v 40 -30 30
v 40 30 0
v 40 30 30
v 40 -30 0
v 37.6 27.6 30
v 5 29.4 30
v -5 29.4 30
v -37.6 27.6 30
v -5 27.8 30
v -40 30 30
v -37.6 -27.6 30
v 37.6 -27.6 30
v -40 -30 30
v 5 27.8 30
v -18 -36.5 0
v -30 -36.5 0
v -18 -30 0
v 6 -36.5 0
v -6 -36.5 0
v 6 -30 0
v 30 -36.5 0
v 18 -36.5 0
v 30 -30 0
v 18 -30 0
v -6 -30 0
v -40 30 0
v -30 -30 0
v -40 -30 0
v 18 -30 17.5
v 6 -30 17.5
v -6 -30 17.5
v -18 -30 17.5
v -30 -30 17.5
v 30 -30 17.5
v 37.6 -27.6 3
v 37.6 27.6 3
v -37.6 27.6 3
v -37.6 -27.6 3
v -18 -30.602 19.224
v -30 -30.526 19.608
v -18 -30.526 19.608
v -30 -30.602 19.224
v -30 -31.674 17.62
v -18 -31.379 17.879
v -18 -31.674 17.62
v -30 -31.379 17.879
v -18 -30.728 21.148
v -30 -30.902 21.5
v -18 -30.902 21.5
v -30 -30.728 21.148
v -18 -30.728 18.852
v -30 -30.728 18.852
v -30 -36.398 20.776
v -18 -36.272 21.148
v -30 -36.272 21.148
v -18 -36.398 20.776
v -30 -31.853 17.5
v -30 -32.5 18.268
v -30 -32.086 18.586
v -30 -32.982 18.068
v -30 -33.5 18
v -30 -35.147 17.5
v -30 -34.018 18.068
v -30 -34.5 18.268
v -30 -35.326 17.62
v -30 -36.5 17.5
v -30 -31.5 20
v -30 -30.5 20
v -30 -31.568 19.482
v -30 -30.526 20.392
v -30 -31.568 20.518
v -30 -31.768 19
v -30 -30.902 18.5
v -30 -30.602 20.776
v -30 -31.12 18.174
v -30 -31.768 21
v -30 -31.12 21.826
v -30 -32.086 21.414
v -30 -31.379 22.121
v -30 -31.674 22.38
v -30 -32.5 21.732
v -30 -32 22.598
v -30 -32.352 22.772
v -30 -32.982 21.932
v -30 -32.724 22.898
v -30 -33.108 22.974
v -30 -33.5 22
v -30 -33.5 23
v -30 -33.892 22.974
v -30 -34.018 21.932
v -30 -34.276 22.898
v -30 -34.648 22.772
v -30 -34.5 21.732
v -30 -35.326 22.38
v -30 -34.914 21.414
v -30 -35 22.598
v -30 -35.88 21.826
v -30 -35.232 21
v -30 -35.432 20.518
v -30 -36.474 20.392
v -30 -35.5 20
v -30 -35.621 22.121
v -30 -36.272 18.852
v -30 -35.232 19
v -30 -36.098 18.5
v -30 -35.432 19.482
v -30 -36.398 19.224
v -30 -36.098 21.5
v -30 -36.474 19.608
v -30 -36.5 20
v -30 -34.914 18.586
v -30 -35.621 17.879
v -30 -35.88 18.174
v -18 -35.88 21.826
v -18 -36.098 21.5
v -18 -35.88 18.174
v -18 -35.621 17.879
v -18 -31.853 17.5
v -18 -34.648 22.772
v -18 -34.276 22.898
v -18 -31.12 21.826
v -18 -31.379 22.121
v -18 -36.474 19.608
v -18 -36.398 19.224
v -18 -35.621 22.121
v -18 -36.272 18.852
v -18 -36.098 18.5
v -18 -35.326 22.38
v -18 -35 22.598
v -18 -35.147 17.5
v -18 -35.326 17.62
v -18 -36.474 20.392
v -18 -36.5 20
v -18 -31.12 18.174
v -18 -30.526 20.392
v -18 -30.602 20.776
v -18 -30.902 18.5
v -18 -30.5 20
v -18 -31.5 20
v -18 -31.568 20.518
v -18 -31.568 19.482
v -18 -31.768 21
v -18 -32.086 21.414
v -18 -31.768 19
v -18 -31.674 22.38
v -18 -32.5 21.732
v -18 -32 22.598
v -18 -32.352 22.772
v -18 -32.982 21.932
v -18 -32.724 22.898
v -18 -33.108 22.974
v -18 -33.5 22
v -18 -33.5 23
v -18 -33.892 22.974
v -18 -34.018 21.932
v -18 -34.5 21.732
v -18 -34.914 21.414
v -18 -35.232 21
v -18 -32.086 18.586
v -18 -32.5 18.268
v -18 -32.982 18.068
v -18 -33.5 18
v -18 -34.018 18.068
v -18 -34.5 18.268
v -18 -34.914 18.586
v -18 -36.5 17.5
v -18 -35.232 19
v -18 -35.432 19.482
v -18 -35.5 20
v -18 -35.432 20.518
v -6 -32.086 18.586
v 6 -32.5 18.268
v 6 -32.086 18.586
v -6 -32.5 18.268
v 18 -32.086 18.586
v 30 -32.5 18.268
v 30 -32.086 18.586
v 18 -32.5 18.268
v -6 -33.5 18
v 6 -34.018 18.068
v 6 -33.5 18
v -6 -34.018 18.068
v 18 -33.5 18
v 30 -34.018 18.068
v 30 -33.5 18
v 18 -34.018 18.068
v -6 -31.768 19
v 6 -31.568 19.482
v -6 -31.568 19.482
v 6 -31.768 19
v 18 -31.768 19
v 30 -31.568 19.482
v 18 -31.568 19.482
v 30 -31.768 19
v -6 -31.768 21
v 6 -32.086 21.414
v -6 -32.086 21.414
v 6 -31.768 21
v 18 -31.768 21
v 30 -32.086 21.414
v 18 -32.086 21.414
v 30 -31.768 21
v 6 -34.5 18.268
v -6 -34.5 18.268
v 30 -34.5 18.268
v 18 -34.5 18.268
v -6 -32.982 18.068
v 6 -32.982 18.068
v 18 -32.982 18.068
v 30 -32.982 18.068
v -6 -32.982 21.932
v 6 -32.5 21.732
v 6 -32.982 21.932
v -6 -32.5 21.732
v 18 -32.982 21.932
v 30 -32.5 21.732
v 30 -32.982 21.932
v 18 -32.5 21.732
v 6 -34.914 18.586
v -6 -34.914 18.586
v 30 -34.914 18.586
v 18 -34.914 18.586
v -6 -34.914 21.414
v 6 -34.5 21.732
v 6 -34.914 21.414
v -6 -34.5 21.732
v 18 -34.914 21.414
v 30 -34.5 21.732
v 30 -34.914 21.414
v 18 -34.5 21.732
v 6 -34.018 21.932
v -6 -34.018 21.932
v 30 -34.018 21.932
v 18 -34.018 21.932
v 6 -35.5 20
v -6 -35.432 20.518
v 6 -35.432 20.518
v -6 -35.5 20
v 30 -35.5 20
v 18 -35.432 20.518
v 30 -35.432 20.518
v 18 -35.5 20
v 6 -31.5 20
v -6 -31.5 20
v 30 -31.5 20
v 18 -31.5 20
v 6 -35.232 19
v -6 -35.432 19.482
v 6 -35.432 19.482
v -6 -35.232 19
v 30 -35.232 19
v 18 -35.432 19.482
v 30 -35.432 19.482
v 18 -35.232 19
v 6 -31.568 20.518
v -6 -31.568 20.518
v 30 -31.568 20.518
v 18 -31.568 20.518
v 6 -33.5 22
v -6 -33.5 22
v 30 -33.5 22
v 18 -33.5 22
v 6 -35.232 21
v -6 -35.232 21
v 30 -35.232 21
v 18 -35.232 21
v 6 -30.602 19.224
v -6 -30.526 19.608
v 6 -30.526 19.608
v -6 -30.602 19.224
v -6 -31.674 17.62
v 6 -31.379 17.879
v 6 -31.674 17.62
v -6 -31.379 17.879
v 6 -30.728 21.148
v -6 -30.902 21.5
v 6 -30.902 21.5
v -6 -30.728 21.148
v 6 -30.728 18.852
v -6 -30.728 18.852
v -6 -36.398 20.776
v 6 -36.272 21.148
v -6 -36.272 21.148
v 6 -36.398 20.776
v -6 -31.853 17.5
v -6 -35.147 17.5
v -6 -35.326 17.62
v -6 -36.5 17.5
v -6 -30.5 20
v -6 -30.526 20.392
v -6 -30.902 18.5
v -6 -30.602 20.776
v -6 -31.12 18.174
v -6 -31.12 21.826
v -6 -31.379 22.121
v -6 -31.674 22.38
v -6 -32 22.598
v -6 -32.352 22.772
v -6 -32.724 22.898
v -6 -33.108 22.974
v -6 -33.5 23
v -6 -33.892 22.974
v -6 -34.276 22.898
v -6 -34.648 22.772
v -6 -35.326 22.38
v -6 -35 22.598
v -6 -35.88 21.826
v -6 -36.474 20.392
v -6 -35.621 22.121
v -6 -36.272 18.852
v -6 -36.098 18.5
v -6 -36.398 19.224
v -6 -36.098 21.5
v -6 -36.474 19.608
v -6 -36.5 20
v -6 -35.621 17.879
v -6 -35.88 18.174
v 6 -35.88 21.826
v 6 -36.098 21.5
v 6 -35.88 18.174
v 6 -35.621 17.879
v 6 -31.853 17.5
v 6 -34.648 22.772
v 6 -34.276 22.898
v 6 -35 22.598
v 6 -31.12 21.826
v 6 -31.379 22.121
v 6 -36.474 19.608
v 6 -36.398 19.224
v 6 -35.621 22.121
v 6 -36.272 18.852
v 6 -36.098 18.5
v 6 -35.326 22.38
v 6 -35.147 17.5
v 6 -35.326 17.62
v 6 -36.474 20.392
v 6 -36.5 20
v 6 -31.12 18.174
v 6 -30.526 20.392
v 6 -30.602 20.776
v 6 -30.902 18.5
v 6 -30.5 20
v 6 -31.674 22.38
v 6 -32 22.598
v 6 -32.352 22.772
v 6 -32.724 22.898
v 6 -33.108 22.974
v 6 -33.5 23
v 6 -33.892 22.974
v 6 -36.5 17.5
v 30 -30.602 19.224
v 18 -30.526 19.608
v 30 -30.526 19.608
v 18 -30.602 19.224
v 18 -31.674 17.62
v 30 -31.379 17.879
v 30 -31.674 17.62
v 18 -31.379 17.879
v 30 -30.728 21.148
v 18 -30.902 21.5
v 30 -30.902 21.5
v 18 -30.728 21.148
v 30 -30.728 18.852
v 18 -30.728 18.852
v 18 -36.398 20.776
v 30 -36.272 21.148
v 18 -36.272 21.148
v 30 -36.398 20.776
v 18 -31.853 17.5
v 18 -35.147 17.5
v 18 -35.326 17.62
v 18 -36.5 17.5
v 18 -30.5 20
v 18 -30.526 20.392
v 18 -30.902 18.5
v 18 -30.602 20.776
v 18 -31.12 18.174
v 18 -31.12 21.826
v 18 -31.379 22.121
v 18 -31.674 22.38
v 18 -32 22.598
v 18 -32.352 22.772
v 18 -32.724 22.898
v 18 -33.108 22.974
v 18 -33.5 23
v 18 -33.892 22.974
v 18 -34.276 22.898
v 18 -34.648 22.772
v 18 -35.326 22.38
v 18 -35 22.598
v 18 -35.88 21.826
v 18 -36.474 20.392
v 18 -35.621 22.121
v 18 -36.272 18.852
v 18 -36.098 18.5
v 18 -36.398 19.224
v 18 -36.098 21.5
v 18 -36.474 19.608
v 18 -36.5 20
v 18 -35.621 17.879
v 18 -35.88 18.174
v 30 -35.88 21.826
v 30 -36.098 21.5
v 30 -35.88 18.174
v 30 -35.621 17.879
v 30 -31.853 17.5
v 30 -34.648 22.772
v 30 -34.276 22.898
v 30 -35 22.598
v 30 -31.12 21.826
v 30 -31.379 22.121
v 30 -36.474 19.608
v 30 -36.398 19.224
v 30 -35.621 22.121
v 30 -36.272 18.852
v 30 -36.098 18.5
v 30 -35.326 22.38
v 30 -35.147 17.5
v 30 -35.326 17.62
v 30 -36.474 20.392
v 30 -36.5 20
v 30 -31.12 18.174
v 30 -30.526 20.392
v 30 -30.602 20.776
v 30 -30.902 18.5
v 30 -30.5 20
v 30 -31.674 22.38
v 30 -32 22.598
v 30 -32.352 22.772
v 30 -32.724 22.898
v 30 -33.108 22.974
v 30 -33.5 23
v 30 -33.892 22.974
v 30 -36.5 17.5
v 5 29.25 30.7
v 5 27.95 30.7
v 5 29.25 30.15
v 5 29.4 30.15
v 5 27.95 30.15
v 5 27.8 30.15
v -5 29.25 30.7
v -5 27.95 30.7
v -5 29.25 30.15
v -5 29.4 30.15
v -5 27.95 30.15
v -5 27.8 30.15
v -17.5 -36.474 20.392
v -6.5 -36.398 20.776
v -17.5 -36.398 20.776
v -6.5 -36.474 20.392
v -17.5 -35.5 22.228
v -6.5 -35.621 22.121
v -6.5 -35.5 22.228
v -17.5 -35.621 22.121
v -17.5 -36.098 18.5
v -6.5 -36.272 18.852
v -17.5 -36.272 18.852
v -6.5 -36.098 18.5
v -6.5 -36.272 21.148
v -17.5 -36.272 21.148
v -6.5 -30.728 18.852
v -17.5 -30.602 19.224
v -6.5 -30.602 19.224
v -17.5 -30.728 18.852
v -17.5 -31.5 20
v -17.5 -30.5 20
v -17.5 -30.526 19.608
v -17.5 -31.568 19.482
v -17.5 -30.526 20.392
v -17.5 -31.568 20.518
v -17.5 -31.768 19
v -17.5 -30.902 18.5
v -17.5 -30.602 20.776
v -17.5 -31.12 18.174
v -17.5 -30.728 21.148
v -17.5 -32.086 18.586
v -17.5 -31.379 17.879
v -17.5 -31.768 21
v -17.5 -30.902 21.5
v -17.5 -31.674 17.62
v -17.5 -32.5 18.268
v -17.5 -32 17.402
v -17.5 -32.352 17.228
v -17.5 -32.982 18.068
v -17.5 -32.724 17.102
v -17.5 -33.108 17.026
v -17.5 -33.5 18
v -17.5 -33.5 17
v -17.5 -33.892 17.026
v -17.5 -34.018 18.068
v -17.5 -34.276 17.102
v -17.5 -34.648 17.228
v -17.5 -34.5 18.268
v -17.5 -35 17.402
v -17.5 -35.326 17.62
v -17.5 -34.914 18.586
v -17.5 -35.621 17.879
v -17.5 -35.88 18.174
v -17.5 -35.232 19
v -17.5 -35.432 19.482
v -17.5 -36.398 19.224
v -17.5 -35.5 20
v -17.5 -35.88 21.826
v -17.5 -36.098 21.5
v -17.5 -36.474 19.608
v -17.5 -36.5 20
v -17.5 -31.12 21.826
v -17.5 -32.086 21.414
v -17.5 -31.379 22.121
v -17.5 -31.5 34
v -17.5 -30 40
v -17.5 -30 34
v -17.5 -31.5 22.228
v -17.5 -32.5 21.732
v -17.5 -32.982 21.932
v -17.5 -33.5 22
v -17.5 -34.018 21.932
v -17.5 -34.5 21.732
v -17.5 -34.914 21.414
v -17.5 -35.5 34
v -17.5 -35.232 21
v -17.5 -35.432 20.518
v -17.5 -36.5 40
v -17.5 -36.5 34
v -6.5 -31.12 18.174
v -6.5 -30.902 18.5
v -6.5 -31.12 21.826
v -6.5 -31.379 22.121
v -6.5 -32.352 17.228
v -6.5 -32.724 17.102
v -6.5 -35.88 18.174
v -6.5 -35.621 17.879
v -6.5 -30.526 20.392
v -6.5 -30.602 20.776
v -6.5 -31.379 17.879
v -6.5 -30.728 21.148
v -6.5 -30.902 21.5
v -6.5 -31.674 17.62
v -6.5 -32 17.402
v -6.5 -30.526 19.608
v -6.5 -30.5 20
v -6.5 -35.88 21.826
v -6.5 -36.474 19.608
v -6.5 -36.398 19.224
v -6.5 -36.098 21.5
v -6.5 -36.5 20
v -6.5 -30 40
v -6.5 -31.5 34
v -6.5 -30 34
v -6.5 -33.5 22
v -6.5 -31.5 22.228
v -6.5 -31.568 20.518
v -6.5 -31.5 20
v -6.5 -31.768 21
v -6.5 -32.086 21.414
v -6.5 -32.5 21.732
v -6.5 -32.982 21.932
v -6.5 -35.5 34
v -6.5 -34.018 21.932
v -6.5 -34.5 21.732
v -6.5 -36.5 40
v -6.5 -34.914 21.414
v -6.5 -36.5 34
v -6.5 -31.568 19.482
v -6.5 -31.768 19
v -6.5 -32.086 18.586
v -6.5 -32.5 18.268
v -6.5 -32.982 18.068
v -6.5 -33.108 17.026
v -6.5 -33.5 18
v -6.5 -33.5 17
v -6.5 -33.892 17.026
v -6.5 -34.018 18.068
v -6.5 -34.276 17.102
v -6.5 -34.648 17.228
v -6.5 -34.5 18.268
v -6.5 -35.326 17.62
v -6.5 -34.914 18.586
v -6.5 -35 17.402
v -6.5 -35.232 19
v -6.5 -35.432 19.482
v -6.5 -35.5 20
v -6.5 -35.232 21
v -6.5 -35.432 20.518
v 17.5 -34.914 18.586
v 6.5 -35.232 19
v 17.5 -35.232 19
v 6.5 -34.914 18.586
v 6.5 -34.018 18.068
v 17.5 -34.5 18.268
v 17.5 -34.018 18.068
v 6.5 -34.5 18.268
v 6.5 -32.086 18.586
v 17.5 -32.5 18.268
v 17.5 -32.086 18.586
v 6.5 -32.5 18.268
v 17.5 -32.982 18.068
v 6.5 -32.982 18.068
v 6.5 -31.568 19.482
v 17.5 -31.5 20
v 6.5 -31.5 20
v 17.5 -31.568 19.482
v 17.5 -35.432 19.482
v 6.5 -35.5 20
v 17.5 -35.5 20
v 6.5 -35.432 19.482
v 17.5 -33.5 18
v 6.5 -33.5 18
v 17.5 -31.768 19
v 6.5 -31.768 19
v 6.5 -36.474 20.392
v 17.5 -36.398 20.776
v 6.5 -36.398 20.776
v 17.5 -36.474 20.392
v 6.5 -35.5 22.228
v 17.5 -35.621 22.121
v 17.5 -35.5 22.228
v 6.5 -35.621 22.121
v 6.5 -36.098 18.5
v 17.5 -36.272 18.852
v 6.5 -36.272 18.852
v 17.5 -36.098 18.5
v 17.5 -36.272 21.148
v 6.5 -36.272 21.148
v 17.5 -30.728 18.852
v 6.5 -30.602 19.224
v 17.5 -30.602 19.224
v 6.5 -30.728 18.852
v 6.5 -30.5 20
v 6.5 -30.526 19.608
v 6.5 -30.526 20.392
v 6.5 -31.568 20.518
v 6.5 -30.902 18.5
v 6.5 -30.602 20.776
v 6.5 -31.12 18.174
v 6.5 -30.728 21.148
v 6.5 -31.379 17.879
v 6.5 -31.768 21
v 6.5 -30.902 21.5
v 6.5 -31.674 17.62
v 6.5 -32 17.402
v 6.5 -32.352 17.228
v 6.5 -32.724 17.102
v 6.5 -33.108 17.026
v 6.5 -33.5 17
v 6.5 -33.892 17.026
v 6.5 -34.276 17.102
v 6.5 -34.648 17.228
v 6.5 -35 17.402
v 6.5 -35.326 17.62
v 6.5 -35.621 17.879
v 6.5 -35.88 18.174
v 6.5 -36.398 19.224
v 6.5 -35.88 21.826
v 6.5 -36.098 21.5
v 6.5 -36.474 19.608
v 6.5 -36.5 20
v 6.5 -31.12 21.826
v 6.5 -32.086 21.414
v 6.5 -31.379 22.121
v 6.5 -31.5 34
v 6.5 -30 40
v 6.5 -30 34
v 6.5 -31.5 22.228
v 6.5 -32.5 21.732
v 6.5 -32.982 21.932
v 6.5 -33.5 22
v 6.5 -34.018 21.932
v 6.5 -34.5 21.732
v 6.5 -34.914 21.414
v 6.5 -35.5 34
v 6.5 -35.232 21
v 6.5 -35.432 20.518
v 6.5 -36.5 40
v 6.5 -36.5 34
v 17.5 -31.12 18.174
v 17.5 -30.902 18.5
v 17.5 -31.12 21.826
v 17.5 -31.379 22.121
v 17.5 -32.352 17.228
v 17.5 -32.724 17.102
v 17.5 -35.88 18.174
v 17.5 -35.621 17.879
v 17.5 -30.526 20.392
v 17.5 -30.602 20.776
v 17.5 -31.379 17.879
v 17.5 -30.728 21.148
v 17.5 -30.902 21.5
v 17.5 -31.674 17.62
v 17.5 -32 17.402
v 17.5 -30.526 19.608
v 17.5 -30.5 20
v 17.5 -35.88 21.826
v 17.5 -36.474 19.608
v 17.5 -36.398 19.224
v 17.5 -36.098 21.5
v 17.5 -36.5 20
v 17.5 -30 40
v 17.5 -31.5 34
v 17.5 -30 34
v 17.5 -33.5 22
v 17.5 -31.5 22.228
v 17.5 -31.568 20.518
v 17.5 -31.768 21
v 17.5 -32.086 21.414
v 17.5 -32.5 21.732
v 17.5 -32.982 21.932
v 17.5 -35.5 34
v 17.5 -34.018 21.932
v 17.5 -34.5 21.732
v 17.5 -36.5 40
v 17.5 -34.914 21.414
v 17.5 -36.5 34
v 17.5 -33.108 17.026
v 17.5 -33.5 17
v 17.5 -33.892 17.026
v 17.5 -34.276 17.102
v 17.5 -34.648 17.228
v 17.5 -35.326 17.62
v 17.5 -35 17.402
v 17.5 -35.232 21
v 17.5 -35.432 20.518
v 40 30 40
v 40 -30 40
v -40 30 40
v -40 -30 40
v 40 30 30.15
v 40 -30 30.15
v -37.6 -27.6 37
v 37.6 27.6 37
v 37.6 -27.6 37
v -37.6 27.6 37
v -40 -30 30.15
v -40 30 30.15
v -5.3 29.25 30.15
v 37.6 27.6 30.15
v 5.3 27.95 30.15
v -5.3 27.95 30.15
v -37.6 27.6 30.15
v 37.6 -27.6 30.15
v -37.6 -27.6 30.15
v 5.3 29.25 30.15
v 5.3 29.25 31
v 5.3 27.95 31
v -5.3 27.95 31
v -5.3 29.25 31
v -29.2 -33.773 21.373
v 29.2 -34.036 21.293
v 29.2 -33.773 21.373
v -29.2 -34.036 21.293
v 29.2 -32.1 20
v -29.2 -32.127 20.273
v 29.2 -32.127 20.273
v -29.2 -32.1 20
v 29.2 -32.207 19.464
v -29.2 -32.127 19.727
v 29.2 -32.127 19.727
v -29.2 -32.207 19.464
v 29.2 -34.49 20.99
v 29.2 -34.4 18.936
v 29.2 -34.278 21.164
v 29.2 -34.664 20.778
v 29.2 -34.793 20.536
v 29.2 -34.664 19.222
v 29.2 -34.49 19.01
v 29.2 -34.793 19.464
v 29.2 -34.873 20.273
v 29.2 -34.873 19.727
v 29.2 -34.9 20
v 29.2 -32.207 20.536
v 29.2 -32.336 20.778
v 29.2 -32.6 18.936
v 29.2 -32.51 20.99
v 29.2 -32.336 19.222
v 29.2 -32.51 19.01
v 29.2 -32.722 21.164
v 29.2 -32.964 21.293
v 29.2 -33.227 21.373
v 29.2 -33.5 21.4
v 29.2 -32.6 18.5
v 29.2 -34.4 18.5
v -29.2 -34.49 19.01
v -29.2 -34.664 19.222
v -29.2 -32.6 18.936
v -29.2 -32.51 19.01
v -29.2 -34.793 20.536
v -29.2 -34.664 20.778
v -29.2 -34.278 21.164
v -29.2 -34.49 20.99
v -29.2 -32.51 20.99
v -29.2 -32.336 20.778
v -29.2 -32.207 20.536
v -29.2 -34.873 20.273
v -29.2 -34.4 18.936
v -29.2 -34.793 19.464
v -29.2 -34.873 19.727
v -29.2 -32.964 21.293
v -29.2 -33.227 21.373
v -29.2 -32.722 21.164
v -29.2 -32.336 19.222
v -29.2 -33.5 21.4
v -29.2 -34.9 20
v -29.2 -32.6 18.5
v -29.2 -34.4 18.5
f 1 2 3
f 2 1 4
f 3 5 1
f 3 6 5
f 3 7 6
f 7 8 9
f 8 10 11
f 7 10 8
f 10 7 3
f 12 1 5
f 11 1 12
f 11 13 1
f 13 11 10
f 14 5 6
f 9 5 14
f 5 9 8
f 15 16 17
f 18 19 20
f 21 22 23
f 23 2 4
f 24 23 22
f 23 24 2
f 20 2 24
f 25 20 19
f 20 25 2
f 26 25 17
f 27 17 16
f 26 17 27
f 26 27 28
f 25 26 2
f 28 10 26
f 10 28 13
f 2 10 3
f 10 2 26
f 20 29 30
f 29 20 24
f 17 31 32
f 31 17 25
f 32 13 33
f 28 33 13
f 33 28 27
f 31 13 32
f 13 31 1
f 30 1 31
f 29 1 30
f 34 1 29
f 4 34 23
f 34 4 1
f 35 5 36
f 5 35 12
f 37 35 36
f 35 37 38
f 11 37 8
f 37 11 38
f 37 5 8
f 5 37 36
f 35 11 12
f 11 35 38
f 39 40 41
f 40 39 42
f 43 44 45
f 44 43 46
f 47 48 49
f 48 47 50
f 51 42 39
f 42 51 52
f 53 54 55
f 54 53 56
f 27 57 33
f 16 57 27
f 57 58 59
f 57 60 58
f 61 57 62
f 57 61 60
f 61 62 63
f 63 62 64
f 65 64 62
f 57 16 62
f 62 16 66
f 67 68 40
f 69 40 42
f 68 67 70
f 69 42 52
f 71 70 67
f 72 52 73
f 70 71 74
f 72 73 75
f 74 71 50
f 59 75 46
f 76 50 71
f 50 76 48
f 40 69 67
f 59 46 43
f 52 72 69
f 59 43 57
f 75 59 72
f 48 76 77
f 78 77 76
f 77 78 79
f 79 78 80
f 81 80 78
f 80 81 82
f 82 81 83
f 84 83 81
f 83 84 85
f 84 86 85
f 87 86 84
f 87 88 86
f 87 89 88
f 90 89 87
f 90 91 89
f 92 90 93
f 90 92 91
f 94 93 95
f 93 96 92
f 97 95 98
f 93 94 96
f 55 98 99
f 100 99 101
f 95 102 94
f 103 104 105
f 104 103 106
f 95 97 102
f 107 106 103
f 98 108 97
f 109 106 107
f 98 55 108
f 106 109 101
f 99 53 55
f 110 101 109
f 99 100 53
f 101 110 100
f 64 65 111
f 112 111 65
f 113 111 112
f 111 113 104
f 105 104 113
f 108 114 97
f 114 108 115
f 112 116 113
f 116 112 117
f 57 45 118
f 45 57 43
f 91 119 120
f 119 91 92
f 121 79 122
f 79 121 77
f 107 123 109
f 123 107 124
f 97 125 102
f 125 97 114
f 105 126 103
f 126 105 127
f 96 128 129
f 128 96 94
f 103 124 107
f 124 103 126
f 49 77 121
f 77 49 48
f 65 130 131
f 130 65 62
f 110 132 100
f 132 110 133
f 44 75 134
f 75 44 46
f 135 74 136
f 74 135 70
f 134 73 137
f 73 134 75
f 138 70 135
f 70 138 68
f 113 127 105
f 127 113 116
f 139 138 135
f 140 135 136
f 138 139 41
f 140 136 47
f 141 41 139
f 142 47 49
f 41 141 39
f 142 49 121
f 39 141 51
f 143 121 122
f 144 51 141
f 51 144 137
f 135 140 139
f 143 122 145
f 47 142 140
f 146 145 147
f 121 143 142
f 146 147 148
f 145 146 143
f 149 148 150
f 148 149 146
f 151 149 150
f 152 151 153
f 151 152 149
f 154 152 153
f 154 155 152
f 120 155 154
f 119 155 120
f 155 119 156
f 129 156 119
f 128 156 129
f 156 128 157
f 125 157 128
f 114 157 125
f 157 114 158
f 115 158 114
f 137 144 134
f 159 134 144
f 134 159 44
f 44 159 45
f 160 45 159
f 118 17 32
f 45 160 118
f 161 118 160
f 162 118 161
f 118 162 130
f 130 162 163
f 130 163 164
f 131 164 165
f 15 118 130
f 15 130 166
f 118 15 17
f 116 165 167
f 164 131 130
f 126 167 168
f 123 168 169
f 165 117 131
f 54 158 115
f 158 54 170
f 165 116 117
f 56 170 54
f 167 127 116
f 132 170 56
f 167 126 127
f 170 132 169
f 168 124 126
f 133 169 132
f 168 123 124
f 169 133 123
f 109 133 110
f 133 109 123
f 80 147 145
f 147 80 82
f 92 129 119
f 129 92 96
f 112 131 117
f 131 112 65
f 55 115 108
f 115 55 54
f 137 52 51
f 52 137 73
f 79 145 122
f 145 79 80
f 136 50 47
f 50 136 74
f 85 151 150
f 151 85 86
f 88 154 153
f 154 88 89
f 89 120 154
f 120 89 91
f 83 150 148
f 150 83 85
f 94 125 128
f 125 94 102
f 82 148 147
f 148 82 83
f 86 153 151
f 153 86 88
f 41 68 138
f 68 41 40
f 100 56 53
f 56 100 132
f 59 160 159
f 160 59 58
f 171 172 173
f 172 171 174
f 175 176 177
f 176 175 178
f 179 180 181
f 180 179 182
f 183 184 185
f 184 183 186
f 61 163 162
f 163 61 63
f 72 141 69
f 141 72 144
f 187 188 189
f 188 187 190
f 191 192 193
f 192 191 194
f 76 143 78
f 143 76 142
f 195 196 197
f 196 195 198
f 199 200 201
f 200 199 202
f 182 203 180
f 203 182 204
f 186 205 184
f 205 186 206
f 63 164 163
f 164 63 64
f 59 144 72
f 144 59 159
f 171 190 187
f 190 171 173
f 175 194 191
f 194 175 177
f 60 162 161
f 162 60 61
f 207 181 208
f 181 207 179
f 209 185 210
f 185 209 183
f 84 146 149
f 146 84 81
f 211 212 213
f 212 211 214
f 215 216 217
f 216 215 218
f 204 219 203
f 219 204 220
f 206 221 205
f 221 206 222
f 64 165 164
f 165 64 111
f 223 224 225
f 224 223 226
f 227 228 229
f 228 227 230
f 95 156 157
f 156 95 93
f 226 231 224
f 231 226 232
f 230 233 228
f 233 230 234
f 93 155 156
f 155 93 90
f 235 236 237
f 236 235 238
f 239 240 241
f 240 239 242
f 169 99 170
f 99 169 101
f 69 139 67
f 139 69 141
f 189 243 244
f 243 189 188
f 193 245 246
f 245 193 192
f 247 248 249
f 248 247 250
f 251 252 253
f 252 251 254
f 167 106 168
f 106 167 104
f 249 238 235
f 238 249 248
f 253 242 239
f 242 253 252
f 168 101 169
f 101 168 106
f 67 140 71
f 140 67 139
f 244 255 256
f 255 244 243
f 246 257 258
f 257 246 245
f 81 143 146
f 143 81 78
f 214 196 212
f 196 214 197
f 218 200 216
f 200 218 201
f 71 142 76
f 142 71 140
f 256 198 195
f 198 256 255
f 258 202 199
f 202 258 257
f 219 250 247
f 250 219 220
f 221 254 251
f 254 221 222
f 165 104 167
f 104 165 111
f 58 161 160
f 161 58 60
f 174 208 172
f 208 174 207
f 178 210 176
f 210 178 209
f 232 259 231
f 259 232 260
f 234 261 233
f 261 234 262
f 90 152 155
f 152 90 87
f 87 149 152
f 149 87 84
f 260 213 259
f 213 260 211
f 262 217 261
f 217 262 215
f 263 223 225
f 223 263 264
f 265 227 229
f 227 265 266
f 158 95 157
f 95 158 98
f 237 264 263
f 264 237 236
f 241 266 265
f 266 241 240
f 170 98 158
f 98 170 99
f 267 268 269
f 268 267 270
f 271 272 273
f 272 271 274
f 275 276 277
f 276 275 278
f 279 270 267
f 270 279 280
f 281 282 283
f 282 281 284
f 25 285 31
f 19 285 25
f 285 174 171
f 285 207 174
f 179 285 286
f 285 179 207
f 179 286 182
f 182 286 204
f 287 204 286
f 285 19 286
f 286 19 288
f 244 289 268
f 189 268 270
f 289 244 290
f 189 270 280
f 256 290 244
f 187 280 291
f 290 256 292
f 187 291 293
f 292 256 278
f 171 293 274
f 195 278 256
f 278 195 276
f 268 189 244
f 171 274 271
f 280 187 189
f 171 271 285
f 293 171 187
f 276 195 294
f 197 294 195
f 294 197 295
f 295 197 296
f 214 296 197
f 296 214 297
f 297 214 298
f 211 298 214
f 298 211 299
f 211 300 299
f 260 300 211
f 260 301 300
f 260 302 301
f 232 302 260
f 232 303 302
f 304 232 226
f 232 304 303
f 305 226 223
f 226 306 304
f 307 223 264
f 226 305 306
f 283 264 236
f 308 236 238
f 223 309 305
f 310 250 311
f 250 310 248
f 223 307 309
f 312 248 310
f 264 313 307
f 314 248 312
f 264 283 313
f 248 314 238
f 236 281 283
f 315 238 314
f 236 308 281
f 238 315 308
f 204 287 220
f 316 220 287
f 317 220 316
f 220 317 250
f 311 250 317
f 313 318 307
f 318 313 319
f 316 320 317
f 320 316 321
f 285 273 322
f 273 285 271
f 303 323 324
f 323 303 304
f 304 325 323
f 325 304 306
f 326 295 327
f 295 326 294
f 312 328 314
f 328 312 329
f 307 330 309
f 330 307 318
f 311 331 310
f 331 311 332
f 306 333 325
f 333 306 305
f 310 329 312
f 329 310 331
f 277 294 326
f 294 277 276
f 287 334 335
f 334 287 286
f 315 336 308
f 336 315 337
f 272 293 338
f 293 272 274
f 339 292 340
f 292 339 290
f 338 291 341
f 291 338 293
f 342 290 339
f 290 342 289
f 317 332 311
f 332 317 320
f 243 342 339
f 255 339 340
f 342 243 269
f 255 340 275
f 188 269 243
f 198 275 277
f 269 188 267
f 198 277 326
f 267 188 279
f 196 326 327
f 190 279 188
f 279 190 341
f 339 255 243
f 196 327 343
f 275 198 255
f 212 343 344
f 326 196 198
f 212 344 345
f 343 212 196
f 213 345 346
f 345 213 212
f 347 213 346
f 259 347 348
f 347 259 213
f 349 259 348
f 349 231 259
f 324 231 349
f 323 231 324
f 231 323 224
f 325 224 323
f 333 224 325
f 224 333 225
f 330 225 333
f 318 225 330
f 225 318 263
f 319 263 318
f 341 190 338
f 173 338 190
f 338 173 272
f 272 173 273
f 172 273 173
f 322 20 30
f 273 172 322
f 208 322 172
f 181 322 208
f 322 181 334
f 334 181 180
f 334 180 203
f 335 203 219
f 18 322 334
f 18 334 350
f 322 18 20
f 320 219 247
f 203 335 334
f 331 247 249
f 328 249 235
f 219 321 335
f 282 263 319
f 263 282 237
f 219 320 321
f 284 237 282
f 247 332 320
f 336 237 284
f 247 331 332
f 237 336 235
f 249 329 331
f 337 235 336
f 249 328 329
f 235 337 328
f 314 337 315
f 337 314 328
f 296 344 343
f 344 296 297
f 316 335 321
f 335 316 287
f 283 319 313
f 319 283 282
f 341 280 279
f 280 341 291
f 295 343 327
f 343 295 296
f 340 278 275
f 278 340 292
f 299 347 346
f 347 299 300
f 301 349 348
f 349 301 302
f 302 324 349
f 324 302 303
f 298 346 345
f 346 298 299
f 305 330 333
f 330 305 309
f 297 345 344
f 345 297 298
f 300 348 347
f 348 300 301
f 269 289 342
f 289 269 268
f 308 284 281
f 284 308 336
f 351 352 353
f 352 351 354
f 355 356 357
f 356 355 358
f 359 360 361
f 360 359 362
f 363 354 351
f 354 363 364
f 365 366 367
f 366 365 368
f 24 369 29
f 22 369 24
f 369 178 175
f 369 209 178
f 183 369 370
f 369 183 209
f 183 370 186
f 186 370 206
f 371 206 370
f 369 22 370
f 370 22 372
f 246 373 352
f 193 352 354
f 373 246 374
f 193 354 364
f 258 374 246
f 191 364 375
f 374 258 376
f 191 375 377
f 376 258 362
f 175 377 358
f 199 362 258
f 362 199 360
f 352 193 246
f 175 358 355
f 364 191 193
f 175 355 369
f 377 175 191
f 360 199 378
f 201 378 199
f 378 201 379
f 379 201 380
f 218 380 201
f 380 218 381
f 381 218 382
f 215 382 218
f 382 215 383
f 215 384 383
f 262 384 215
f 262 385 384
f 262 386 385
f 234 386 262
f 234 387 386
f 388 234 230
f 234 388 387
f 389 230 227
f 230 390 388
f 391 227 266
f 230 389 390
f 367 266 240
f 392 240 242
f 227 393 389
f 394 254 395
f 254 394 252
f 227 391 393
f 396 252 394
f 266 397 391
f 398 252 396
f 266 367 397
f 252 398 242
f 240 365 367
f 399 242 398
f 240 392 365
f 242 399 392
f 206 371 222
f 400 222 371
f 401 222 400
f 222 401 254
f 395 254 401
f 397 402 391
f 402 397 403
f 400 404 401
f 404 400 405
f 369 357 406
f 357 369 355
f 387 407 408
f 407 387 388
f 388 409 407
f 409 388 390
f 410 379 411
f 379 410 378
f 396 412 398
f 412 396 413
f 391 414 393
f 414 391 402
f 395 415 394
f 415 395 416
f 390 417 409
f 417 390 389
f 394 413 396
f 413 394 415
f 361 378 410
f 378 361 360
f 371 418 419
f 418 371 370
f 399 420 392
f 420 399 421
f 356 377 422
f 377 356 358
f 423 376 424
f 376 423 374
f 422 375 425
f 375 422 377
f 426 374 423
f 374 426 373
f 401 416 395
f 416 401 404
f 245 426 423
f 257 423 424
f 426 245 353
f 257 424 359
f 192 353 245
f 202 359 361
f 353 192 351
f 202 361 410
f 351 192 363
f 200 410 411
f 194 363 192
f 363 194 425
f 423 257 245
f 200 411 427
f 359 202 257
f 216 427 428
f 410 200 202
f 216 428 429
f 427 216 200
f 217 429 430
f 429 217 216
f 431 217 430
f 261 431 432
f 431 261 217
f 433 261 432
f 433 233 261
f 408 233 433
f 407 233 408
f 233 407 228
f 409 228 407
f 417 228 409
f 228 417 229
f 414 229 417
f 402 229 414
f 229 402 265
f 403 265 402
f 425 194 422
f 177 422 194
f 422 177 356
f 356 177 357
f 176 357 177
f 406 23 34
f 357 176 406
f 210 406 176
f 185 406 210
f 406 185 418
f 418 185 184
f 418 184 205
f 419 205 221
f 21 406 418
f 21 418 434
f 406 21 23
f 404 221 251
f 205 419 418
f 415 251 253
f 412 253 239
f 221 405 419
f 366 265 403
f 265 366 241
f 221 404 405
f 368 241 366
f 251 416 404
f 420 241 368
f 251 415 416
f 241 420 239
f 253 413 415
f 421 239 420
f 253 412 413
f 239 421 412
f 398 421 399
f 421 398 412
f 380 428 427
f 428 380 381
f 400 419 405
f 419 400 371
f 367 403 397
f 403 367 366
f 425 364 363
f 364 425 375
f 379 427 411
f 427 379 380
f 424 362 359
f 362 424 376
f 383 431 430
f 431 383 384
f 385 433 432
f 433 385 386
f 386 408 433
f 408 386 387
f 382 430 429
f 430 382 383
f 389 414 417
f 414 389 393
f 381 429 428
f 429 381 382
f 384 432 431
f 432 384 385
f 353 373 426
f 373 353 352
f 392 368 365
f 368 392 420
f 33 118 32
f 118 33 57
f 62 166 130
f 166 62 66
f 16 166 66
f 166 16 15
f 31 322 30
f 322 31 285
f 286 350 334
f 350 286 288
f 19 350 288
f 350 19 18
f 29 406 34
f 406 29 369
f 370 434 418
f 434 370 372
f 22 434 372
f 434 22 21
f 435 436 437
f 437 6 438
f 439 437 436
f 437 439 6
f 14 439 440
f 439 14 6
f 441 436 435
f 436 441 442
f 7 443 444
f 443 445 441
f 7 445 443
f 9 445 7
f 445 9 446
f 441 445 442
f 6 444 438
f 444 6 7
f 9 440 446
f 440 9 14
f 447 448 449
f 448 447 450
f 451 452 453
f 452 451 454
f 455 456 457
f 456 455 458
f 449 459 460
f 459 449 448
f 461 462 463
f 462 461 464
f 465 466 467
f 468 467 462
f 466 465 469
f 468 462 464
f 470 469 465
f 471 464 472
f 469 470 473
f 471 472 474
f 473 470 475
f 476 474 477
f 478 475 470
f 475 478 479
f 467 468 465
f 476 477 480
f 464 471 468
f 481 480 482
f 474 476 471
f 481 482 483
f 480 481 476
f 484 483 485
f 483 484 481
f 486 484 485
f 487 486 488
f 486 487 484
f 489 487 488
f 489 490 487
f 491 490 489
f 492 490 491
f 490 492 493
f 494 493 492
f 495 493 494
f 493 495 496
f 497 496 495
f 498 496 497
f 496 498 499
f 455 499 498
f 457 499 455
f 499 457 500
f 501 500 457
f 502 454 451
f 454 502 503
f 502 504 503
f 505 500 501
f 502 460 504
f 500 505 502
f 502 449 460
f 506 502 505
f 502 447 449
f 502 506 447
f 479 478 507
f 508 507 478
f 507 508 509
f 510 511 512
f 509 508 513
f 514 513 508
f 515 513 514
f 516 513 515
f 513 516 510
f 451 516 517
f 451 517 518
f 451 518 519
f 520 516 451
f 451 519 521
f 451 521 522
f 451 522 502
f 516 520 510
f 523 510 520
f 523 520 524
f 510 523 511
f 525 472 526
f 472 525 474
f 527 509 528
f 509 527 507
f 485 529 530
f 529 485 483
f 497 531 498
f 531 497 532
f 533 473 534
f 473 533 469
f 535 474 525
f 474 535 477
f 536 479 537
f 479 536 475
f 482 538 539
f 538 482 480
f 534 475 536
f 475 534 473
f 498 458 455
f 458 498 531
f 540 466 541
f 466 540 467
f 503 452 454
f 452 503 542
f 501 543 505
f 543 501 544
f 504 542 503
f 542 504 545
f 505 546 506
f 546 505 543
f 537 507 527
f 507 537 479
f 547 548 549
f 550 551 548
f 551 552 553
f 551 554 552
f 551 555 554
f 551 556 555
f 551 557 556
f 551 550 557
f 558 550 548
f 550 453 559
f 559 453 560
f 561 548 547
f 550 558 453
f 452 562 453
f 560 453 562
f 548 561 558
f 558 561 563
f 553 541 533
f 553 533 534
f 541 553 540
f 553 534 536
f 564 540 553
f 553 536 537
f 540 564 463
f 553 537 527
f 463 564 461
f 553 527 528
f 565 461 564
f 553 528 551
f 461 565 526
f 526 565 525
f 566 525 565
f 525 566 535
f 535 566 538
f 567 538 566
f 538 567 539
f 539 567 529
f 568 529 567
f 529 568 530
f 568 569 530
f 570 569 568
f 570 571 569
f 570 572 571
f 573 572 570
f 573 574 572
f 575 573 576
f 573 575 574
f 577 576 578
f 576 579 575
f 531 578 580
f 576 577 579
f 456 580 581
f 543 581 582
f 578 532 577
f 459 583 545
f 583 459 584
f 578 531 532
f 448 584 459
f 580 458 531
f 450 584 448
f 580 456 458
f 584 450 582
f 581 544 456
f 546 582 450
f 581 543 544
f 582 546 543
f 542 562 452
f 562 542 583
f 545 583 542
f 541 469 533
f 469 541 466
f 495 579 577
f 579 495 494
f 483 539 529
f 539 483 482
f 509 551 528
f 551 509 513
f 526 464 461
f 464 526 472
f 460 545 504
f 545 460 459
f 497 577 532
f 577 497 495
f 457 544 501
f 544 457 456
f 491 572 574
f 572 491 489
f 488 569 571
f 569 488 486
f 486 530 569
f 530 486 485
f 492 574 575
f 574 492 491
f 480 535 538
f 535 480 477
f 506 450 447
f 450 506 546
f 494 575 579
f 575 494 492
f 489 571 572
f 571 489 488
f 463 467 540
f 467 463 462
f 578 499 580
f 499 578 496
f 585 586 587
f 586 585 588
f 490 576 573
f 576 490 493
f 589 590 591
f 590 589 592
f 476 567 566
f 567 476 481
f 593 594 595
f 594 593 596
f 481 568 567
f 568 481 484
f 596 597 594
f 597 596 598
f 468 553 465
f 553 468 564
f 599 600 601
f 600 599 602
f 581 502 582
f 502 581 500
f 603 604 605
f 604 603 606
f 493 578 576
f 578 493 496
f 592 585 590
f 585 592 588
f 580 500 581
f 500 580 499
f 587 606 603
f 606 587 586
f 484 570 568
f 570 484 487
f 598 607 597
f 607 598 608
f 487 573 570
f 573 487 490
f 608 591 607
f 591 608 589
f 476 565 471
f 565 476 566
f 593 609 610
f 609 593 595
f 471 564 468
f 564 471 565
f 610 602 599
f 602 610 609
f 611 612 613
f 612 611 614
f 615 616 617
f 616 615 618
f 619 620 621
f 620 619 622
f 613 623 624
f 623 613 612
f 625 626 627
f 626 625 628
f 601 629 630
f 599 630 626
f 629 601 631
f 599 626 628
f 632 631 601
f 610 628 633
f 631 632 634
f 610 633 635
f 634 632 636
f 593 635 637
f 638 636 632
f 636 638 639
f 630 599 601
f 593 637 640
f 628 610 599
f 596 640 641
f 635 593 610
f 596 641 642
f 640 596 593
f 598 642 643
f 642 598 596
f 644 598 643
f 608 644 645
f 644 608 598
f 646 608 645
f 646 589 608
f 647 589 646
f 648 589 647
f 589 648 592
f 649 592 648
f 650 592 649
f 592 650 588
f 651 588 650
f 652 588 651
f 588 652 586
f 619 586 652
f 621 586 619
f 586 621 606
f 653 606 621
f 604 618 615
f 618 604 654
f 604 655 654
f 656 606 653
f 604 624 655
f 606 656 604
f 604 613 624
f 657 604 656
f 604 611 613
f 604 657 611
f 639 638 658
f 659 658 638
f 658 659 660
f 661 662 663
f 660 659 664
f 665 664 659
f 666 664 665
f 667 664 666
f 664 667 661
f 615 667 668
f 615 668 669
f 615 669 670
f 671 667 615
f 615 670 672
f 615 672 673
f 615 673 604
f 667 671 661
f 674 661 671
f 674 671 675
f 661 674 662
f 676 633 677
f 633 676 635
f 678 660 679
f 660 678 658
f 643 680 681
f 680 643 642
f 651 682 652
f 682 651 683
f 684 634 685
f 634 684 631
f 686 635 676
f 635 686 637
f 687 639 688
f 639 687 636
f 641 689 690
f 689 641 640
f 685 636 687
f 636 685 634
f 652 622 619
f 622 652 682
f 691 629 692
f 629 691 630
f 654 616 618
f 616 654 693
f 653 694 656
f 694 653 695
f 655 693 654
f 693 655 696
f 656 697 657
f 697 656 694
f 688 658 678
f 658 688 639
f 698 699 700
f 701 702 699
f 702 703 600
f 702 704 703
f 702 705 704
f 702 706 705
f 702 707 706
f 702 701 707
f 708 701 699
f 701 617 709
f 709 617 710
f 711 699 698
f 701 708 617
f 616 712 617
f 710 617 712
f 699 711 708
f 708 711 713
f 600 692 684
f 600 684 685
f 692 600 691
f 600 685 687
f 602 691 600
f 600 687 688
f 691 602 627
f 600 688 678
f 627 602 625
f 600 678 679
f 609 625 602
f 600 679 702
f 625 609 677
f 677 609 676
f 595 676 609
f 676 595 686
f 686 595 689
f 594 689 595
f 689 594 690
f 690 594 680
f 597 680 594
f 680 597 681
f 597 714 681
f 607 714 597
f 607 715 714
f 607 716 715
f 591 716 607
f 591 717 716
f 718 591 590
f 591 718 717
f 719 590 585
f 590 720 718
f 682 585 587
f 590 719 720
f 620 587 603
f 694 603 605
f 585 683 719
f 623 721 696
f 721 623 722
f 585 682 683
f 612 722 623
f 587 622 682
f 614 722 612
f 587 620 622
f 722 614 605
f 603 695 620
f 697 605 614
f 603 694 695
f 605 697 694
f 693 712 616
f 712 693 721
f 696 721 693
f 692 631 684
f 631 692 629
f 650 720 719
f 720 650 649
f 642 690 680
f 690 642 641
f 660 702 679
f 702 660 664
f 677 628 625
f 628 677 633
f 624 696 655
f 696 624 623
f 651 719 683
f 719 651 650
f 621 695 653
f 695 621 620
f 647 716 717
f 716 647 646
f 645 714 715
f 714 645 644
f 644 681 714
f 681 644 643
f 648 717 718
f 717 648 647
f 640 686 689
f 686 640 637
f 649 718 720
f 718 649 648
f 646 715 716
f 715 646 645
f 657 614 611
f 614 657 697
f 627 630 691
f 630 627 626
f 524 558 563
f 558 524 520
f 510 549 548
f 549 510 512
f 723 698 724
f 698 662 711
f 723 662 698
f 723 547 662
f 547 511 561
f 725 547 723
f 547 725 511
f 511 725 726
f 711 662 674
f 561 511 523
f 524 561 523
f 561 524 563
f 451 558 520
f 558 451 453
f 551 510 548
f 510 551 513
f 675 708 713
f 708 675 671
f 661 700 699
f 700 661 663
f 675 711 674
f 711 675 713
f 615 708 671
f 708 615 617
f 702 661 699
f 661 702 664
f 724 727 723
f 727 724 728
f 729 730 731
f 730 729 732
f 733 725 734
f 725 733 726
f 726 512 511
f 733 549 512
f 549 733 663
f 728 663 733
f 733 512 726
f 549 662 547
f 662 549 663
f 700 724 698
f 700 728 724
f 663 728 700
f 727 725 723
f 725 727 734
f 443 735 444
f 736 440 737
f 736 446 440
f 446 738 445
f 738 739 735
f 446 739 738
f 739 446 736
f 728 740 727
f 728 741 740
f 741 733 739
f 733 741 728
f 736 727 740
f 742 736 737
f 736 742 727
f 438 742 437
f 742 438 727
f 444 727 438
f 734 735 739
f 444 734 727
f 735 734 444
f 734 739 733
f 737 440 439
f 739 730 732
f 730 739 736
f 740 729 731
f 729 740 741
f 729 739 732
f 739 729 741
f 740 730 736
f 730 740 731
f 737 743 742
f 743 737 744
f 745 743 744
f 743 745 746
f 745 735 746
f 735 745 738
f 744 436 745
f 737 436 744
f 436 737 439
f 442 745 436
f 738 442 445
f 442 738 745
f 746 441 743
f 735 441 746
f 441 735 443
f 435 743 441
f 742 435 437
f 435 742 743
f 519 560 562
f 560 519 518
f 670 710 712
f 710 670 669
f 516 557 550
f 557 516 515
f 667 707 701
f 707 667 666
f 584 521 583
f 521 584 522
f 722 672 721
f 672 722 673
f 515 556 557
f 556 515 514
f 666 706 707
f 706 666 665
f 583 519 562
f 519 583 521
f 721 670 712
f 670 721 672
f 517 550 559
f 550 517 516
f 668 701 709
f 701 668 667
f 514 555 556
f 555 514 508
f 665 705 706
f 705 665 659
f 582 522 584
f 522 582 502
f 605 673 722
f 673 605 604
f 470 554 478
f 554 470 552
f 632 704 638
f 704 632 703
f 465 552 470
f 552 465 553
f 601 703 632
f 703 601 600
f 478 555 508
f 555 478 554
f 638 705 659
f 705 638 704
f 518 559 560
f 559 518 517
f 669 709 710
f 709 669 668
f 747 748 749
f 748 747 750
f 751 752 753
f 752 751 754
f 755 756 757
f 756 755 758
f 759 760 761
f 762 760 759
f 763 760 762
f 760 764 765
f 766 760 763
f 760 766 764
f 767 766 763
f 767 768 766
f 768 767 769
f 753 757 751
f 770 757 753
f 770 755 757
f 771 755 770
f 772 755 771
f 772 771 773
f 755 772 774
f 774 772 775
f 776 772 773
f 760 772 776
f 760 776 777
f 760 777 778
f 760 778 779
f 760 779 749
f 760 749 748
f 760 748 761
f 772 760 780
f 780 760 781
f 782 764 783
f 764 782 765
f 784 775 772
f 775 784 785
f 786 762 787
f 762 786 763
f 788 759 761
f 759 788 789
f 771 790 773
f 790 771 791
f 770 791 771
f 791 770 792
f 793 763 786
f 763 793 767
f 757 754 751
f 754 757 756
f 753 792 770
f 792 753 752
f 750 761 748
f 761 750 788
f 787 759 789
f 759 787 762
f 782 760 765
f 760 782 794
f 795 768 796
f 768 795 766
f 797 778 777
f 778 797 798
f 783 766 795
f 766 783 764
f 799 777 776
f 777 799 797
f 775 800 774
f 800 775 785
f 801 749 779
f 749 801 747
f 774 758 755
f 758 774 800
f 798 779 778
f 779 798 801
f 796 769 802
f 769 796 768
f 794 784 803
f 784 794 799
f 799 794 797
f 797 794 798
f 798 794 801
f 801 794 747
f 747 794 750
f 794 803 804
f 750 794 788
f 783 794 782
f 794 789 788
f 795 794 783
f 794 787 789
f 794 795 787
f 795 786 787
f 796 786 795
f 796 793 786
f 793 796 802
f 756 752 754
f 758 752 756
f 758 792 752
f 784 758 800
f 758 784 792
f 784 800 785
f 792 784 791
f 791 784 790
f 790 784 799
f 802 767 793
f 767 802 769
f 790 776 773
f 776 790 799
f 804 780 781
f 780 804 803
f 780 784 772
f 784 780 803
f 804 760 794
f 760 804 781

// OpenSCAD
part = "assembly"; // [base, lid, pin, assembly]
cadverify_only = "";
module instance(name, part, unit = 1) {
  echo(cadverify_instance = [name, part, unit]);
  if (cadverify_only == "" || cadverify_only == name) children();
}
Ya = -33.5; Za = 20; Kr = 3.0; Br = 2.0; Pr = 1.4;
BX = [[-30,-18],[-6,6],[18,30]];
LX = [[-17.5,-6.5],[6.5,17.5]];
module barrelX(x0, x1) {
  difference() {
    translate([0,Ya,Za]) rotate([0,90,0]) translate([0,0,(x0+x1)/2])
      cylinder(h=x1-x0, r=Kr, center=true, $fn=48);
    translate([0,Ya,Za]) rotate([0,90,0]) translate([0,0,(x0+x1)/2])
      cylinder(h=(x1-x0)+1.0, r=Br, center=true, $fn=24);
  }
}
module base_geom() {
  difference() {
    union() {
      difference() {
        translate([-40,-30,0]) cube([80,60,30]);
        translate([-37.6,-27.6,3]) cube([75.2,55.2,27.01]);
      }
      for (b=BX) {
        translate([b[0],-36.5,0]) cube([b[1]-b[0],6.5,17.5]);
        barrelX(b[0], b[1]);
      }
      translate([-5,27.8,30]) cube([10,1.6,0.7]);
    }
    translate([0,Ya,Za]) rotate([0,90,0]) translate([0,0,0])
      cylinder(h=62, r=Br, center=true, $fn=24);
  }
}
module lid_open() {
  difference() {
    union() {
      translate([-40,-97,0]) cube([80,60,3]);
      translate([-40,-97,3]) cube([80,2.4,6.85]);
      translate([-40,-39.4,3]) cube([80,2.4,6.85]);
      translate([-40,-97,3]) cube([2.4,60,6.85]);
      translate([37.6,-97,3]) cube([2.4,60,6.85]);
      for (b=LX) {
        translate([b[0],-39,0]) cube([b[1]-b[0],8.5,6]);
        translate([b[0],-35.5,3]) cube([b[1]-b[0],4,17.5]);
        barrelX(b[0], b[1]);
      }
    }
    translate([-5.3,-96.25,9.0]) cube([10.6,1.3,1.1]);
    translate([0,Ya,Za]) rotate([0,90,0]) translate([0,0,0])
      cylinder(h=62, r=Br, center=true, $fn=24);
  }
}
module pin_geom() {
  union() {
    translate([-29.2,0,1.5]) rotate([0,90,0])
      cylinder(h=58.4, r=Pr, center=false, $fn=32);
    translate([-29.2,-0.9,0]) cube([58.4,1.8,0.5]);
  }
}
module lid_closed() {
  translate([0,Ya,Za]) rotate([180,0,0]) translate([0,-Ya,-Za]) lid_open();
}
module pin_placed() {
  translate([0,Ya,Za-1.5]) pin_geom();
}
if (part=="base") {
  base_geom();
  echo(cadverify_spec=[
    ["bounds", [[-40,-36.5,0],[40,30,30.7]]],
    ["bodies", 1],
    ["support_faces", [["base","-z",4000]]],
    ["overhangs_allowed", [["hinge", [[-30,-37,16],[30,-30,24]]]]],
    ["copies", 1],
    ["details", [
      ["bottom","thickness",[0,0,-1],[0,0,1],3],
      ["cavity","void",[[-37.6,-27.6,3],[37.6,27.6,30]],0.9],
      ["knuckle","material",[[-30,-36.5,17],[-18,-30.5,23]],0.4],
      ["bore","hole",[-31,-33.5,20],[1,0,0],[[0,4.0],[10,4.0]]],
      ["catch","material",[[-5,27.8,30],[5,29.4,30.7]],0.6]
    ]]
  ]);
} else if (part=="lid") {
  lid_open();
  echo(cadverify_spec=[
    ["bounds", [[-40,-97,0],[40,-30.5,23]]],
    ["bodies", 1],
    ["support_faces", [["lid","-z",4000]]],
    ["overhangs_allowed", [["hinge", [[-30,-37,16],[30,-30,24]]]]],
    ["copies", 1],
    ["details", [
      ["plate","thickness",[0,-67,-1],[0,0,1],3],
      ["pocket","void",[[-37.6,-94.6,3],[37.6,-39.4,9.85]],0.9],
      ["knuckle","material",[[-17.5,-36.5,17],[-6.5,-30.5,23]],0.4],
      ["bore","hole",[-18,-33.5,20],[1,0,0],[[0,4.0],[9,4.0]]],
      ["notch","void",[[-5.3,-96.25,9.0],[5.3,-94.95,10.1]],0.9]
    ]]
  ]);
} else if (part=="pin") {
  pin_geom();
  echo(cadverify_spec=[
    ["bounds", [[-29.2,-1.4,0],[29.2,1.4,2.9]]],
    ["bodies", 1],
    ["support_faces", [["pin","-z",50]]],
    ["overhangs_allowed", [["pinFlankA", [[-29.3,-1.1,0.2],[29.3,-0.8,0.6]]],["pinFlankB", [[-29.3,0.8,0.2],[29.3,1.1,0.6]]]]],
    ["copies", 1],
    ["details", [
      ["shaft","thickness",[0,5,1.5],[0,-1,0],2.8],
      ["fin","thickness",[0,0,-1],[0,0,1],2.9]
    ]]
  ]);
} else {
  instance("base","base") base_geom();
  instance("lid","lid") lid_closed();
  instance("pin","pin") pin_placed();
  echo(cadverify_spec=[
    ["bounds", [[-40,-36.5,0],[40,30,40]]],
    ["support_faces", [["bed","-z",4000]]],
    ["allowed_interferences", [["base","lid","catch press"]]],
    ["motions", [["swing",["lid"],"rotate",[0,-33.5,20],[1,0,0],[0,180],["flex",[["lid","base",0.5,"catch entry"]]]]]],
    ["assembly_order", [[["base"],[0,0,0]],[["lid"],[0,0,1]],[["pin"],[-1,0,0]]]],
    ["print_in_place", 0.4],
    ["print_pose", [["swing",180]]],
    ["overhangs_allowed", [["hinge", [[-30,-37,16],[30,-30,24]]]]]
  ]);
}
